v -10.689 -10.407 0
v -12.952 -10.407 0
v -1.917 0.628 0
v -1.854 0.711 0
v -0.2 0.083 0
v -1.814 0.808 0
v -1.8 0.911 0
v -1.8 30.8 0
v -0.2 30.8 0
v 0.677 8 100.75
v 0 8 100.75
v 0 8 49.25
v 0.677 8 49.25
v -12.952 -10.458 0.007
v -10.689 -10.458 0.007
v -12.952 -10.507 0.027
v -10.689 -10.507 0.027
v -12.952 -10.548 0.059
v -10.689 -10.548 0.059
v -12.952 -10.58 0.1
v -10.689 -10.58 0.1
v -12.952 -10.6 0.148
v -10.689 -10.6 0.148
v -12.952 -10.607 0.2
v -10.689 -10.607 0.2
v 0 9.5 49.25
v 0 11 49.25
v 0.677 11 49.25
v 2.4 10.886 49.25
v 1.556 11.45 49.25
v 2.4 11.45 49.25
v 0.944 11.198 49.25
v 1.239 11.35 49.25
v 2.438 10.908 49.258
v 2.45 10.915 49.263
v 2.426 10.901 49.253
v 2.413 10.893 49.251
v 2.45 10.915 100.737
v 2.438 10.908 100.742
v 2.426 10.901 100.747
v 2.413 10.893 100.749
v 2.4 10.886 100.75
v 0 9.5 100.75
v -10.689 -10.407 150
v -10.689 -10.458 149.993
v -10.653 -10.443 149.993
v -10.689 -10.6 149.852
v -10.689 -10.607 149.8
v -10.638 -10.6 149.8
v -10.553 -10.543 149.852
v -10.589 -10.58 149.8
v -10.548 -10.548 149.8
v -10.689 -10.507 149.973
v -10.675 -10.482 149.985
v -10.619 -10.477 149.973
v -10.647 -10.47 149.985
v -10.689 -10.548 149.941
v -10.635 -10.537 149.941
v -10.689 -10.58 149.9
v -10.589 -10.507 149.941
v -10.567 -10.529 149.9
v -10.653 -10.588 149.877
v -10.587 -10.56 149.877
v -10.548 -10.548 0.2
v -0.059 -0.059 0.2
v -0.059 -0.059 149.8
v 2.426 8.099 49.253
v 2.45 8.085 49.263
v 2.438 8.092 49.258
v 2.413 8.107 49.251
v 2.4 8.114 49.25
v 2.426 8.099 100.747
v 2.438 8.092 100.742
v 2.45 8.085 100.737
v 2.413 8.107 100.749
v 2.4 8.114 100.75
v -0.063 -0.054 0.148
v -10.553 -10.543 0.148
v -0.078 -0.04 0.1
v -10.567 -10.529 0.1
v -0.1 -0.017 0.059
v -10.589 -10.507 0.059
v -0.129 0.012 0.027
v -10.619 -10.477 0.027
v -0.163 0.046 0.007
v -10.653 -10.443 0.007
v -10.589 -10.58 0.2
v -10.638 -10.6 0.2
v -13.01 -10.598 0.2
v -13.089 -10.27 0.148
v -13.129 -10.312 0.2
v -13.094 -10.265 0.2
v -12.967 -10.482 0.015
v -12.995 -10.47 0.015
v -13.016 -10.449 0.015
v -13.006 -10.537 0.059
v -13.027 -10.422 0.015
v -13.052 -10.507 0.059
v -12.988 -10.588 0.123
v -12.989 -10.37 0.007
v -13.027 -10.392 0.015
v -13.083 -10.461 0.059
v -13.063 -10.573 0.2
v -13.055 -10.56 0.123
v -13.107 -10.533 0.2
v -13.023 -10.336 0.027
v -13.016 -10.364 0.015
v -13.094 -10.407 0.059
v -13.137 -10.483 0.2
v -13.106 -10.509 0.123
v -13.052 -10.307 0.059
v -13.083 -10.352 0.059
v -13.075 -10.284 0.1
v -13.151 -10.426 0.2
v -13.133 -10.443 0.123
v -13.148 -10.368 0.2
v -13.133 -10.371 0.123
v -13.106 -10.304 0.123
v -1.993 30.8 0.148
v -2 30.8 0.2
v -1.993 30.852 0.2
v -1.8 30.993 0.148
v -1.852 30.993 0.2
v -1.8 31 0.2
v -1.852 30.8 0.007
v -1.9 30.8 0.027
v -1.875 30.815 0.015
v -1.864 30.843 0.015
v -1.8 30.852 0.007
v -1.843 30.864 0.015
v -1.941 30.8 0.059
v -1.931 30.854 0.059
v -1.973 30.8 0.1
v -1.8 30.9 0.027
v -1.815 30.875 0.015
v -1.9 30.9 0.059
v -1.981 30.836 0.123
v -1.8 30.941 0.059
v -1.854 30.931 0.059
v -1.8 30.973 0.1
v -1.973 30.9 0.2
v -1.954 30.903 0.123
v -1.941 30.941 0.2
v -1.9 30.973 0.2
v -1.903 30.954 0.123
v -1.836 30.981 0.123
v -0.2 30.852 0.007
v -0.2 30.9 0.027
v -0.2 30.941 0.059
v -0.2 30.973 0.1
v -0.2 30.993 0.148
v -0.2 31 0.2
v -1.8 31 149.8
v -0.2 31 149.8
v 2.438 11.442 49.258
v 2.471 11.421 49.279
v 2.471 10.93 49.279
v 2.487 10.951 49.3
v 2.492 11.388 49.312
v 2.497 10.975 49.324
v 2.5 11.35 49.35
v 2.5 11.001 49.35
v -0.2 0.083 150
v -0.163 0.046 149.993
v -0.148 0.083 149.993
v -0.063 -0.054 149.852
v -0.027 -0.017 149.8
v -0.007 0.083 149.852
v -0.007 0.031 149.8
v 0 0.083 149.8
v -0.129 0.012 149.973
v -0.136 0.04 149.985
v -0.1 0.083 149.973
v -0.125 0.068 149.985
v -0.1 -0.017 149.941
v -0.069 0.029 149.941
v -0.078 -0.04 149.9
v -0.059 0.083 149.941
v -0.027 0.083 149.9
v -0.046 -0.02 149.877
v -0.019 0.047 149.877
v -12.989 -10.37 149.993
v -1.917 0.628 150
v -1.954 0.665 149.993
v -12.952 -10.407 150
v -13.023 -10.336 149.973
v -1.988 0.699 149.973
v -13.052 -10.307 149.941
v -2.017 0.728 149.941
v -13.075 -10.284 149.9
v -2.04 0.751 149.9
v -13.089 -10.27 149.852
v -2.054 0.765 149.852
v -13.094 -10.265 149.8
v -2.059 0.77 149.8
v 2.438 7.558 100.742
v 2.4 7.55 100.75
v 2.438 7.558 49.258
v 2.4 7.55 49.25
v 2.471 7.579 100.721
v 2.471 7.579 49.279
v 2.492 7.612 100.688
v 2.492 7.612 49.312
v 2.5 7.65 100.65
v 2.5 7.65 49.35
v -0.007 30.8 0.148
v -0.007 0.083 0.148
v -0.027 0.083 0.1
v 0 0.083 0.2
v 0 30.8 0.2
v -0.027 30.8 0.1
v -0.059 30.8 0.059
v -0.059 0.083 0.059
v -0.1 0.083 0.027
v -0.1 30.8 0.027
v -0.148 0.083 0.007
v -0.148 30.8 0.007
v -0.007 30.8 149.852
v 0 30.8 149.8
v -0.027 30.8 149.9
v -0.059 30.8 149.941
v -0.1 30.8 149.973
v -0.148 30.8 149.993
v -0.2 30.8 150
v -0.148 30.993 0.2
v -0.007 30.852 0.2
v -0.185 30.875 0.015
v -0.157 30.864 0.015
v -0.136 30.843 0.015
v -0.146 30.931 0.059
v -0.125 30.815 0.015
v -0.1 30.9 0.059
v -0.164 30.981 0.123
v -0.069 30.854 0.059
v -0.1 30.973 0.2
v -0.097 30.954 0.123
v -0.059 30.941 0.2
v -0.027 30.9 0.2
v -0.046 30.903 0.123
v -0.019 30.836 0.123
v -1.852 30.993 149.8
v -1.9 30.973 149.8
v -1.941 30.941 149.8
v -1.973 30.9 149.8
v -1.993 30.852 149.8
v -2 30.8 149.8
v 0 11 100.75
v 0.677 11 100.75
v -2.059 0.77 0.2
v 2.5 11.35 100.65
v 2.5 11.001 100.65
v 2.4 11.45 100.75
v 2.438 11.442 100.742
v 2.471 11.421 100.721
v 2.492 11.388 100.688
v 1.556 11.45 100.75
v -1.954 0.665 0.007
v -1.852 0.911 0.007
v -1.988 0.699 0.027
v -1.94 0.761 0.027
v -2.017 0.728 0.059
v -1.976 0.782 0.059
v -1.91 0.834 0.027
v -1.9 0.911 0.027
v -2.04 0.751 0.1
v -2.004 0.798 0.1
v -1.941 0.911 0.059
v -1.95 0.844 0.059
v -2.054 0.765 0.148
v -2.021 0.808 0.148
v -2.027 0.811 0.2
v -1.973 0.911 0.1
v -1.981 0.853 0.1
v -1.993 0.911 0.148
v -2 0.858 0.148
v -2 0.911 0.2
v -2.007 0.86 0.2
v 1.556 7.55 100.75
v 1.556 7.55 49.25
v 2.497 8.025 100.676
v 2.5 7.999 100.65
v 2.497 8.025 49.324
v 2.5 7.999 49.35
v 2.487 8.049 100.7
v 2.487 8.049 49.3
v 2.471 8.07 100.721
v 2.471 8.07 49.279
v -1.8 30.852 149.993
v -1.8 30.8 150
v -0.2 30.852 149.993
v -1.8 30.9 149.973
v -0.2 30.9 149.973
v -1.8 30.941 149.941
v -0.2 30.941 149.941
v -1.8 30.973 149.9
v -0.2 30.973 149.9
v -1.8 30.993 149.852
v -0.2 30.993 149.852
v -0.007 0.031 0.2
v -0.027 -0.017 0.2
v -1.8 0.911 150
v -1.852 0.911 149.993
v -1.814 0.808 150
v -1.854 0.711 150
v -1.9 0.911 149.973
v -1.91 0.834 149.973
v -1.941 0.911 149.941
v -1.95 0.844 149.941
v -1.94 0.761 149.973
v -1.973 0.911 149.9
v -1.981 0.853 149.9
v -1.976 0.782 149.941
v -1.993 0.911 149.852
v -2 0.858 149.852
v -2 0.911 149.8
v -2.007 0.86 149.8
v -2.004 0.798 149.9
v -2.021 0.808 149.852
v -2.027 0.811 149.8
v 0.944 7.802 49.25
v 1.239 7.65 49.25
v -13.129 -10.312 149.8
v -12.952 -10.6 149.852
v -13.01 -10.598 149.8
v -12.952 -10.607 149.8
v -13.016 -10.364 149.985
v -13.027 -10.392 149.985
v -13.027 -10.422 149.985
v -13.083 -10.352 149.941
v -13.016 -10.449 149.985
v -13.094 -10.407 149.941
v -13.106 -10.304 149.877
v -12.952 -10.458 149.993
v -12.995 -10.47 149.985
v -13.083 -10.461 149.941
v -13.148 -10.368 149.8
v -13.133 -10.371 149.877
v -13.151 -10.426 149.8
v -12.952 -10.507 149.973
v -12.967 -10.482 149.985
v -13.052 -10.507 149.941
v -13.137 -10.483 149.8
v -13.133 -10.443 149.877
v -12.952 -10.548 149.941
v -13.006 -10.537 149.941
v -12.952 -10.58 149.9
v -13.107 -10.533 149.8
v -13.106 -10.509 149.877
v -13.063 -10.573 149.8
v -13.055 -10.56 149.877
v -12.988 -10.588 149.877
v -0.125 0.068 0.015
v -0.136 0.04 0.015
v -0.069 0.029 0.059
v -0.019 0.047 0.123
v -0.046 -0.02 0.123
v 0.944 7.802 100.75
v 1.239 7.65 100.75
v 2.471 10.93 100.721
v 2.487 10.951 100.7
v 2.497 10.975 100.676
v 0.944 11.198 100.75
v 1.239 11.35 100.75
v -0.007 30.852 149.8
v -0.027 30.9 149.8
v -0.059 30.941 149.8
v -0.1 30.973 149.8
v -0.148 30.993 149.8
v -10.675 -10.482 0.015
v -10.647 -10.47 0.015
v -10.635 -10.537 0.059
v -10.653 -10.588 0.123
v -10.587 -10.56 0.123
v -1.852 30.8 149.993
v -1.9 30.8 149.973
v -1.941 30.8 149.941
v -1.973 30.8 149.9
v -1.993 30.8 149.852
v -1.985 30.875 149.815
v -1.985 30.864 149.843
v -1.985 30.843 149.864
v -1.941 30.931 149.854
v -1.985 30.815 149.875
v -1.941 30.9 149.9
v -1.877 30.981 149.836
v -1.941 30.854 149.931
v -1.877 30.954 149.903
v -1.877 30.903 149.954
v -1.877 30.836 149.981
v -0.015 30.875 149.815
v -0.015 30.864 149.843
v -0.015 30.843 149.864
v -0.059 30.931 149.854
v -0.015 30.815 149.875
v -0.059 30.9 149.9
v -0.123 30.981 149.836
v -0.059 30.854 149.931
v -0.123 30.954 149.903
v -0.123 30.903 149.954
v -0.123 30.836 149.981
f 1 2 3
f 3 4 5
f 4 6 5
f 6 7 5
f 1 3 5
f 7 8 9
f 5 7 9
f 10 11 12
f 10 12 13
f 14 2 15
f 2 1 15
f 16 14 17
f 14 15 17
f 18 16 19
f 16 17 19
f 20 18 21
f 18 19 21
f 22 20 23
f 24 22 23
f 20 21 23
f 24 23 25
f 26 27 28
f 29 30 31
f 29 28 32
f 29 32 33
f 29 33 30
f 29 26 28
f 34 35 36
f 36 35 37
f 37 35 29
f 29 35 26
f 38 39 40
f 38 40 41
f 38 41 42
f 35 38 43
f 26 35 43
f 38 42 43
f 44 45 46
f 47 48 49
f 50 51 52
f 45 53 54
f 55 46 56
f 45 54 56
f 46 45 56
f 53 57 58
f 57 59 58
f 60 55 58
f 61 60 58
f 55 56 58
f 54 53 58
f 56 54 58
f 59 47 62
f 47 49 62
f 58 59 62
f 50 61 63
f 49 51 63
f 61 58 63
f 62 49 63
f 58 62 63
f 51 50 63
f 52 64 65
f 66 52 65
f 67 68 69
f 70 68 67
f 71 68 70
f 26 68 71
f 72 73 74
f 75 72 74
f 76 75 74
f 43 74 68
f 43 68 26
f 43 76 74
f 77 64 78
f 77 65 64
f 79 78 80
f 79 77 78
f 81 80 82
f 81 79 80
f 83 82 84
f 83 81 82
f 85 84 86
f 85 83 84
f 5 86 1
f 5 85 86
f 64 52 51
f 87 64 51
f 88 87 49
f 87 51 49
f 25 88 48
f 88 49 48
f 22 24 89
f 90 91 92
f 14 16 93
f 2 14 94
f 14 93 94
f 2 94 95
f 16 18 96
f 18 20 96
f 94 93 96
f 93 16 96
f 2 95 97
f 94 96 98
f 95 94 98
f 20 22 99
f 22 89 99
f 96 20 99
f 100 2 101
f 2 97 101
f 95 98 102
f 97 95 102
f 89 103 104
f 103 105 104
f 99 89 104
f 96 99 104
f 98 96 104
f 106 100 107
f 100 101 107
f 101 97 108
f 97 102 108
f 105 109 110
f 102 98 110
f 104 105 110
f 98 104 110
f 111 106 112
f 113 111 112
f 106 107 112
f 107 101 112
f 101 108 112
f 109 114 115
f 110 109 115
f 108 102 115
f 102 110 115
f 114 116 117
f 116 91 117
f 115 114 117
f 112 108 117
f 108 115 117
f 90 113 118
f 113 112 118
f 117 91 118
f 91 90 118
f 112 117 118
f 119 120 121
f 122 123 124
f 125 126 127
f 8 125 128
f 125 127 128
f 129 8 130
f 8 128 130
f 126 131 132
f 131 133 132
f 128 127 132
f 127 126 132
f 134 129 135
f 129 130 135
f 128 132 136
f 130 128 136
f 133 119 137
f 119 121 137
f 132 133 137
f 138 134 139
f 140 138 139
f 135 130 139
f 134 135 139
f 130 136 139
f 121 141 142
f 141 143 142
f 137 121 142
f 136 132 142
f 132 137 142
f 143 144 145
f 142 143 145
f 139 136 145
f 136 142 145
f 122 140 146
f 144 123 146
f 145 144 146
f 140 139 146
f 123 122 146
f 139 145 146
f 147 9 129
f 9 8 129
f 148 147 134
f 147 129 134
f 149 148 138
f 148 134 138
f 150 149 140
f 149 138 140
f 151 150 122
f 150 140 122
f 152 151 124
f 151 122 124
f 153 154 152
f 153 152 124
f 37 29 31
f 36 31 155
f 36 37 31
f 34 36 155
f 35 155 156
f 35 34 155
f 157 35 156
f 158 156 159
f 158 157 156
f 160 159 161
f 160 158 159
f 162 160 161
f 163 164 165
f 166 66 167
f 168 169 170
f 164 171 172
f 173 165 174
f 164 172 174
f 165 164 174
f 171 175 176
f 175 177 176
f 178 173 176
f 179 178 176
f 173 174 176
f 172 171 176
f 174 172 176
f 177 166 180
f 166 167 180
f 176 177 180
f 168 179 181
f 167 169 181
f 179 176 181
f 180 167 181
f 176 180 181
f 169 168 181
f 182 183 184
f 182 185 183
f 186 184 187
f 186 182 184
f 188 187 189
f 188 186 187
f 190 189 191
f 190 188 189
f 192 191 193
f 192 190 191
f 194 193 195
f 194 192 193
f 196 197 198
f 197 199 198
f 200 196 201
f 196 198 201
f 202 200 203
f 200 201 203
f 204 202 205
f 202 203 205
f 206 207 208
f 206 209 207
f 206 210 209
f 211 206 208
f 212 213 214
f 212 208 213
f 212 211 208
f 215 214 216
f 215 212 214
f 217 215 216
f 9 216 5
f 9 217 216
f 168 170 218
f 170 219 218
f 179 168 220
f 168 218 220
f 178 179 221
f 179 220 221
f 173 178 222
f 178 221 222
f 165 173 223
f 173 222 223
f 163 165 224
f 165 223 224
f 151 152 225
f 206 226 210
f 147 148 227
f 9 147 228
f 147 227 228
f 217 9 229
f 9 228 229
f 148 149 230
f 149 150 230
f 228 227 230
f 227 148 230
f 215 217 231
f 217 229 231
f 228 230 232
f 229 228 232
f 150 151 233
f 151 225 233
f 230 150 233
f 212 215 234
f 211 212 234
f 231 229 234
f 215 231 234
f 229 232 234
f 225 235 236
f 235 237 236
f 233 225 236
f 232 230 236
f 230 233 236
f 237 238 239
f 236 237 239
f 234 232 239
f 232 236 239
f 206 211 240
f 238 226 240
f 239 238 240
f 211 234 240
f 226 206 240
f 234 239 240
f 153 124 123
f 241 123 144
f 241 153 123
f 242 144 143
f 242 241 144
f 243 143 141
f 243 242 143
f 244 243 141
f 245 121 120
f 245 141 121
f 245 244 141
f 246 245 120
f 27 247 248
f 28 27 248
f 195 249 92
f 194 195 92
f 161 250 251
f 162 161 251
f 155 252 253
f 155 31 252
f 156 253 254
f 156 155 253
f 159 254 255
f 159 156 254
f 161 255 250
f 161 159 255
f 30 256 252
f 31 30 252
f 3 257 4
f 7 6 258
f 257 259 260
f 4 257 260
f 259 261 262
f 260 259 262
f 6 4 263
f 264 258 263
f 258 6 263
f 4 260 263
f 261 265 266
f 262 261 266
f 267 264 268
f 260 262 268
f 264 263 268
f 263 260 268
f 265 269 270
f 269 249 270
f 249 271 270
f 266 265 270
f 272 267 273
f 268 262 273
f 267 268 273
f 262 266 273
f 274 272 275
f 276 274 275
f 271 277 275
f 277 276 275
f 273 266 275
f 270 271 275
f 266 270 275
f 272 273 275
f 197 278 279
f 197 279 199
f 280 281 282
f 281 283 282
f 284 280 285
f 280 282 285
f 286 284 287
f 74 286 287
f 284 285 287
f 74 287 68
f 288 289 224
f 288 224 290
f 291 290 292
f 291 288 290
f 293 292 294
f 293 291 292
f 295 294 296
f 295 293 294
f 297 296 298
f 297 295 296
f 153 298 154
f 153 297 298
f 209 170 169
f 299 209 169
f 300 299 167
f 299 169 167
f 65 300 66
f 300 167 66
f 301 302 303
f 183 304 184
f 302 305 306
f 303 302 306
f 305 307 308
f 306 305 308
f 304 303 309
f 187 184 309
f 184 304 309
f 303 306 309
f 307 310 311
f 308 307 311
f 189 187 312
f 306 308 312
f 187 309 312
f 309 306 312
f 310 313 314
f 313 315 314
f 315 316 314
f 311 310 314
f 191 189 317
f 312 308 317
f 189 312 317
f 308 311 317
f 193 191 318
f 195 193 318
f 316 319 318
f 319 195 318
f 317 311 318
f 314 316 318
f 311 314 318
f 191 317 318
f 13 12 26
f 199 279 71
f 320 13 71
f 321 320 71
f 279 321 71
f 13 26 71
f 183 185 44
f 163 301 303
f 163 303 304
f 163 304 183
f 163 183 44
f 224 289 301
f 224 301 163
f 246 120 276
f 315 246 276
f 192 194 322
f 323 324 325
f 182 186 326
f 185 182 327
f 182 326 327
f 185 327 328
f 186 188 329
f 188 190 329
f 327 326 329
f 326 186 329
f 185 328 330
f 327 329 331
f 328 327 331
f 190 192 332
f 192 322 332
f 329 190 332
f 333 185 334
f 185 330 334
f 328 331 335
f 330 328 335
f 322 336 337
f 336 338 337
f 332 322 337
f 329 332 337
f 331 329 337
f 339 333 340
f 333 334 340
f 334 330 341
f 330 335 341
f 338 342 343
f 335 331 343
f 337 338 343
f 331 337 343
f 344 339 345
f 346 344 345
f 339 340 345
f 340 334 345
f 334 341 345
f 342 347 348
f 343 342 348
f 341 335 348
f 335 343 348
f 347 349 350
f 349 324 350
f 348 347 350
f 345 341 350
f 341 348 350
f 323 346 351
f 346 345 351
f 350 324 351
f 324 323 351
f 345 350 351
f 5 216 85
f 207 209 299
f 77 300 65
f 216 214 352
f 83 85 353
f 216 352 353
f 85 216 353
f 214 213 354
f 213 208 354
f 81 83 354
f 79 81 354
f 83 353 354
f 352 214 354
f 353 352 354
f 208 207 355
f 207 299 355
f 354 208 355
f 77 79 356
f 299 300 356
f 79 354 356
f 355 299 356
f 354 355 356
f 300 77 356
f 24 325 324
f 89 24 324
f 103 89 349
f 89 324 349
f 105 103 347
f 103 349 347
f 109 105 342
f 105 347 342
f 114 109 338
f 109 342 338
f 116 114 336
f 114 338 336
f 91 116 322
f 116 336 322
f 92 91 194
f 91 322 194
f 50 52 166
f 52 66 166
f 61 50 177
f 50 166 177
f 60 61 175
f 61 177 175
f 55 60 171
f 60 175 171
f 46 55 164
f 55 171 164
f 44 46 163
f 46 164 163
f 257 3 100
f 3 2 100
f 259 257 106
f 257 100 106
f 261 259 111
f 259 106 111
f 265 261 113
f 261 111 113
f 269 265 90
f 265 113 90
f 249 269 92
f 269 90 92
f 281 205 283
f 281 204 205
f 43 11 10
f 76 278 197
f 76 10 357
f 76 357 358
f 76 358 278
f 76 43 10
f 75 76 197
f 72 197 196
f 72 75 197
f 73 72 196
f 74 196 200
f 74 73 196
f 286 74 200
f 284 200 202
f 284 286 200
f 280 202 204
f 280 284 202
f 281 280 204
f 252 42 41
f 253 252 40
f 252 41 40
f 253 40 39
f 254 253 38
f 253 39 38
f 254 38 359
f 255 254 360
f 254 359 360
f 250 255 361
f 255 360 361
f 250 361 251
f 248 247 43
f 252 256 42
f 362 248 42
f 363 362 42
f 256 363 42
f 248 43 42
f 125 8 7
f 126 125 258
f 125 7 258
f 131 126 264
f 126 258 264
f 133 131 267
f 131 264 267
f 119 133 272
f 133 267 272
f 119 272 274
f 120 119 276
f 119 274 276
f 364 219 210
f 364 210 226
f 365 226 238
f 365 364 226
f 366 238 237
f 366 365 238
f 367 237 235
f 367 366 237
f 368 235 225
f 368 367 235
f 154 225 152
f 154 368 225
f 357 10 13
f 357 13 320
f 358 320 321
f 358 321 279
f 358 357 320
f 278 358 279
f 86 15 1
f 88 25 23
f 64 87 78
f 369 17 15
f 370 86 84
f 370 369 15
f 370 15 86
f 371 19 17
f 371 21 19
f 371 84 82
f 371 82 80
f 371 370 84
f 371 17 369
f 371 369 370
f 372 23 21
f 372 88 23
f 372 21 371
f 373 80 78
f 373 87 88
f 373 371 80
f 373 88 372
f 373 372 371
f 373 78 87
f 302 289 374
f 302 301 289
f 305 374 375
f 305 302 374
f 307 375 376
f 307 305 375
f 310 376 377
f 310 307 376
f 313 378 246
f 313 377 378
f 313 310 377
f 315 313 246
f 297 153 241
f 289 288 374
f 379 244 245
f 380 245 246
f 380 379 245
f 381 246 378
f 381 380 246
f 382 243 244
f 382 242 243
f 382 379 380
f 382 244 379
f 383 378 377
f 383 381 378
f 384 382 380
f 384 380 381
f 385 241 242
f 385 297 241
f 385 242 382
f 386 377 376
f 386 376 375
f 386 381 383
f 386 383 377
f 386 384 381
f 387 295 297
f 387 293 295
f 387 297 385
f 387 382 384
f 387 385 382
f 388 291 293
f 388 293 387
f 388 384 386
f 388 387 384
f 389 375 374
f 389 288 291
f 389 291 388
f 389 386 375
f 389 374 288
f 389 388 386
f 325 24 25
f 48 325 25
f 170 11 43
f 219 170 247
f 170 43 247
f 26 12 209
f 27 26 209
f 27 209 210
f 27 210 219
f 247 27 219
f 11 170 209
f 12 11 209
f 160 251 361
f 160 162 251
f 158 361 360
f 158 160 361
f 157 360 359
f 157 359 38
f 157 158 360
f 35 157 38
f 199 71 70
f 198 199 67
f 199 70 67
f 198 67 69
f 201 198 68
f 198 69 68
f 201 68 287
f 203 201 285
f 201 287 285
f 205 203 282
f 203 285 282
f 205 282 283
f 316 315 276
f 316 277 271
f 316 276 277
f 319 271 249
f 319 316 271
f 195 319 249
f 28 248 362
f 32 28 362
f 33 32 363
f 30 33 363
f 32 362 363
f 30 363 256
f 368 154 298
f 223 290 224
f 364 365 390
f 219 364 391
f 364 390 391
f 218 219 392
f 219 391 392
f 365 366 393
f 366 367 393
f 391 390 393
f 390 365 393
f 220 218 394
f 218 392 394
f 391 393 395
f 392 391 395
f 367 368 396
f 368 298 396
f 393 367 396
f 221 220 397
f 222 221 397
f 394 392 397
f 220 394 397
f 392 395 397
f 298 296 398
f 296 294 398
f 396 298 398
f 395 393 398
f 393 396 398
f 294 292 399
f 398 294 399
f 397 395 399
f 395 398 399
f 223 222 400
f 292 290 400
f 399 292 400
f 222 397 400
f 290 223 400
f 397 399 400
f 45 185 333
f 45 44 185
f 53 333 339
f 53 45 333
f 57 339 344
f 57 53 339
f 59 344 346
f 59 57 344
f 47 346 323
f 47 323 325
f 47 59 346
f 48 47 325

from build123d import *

# Parameters (mm, degrees)
EXTRUDE_1_DEPTH = 150
EXTRUDE_START   = -49.25
EXTRUDE_2_DEPTH = 51.5
FILLET_1_R      = 0.1
FILLET_2_R      = 0.2


with BuildPart() as part:
    # 草图1 → 凸台-拉伸1 (new body)
    with BuildSketch(Plane.XY):
        Polygon((0, 0), (0, 31), (-2, 31), (-2, 0.828427125), (-13.435028843, -10.606601718), (-10.606601718, -10.606601718), align=None)
    extrude(amount=EXTRUDE_1_DEPTH)

    # 草图3 → 凸台-拉伸2 (add)
    with BuildSketch(Plane.XY.offset(150).offset(EXTRUDE_START)):
        with BuildLine():
            Line((0, 9.5), (0, 8))
            Line((0, 8), (0.677124344, 8))
            ThreePointArc((0.677124344, 8), (1.088161527, 7.719957697), (1.555590279, 7.55))
            Line((1.555590279, 7.55), (2.5, 7.55))
            Line((2.5, 7.55), (2.5, 8.056624327))
            Line((2.5, 8.056624327), (0, 9.5))
        make_face()
    extrude_2 = extrude(amount=-EXTRUDE_2_DEPTH)

    # 镜向1: 凸台-拉伸2 across plane
    add(extrude_2.mirror(Plane.ZX.offset(9.5)))

    # 圆角1
    fillet_1_edges = [part.edges().sort_by_distance(p)[0] for p in [
        (2.5, 7.803312164, 49.25),
        (2.5, 8.056624327, 75),
        (2.5, 7.55, 75),
        (2.5, 7.803312164, 100.75),
        (2.5, 10.943375673, 75),
        (2.5, 11.196687836, 100.75),
        (2.5, 11.45, 75),
        (2.5, 11.196687836, 49.25),
    ]]
    fillet(fillet_1_edges, radius=FILLET_1_R)

    # 圆角2
    fillet_2_edges = [part.edges().sort_by_distance(p)[0] for p in [
        (-1, 31, 150),
        (-10.606601718, -10.606601718, 75),
        (-13.435028843, -10.606601718, 75),
        (-2, 0.828427125, 75),
        (-2, 31, 75),
        (0, 31, 75),
        (0, 0, 75),
        (-2, 15.914213562, 150),
        (-7.717514421, -4.889087297, 150),
        (-12.02081528, -10.606601718, 150),
        (-5.303300859, -5.303300859, 150),
        (-12.02081528, -10.606601718, 0),
        (-7.717514421, -4.889087297, 0),
        (-2, 15.914213562, 0),
        (0, 15.5, 150),
        (-1, 31, 0),
        (0, 15.5, 0),
        (-5.303300859, -5.303300859, 0),
    ]]
    fillet(fillet_2_edges, radius=FILLET_2_R)


solid = part.part
